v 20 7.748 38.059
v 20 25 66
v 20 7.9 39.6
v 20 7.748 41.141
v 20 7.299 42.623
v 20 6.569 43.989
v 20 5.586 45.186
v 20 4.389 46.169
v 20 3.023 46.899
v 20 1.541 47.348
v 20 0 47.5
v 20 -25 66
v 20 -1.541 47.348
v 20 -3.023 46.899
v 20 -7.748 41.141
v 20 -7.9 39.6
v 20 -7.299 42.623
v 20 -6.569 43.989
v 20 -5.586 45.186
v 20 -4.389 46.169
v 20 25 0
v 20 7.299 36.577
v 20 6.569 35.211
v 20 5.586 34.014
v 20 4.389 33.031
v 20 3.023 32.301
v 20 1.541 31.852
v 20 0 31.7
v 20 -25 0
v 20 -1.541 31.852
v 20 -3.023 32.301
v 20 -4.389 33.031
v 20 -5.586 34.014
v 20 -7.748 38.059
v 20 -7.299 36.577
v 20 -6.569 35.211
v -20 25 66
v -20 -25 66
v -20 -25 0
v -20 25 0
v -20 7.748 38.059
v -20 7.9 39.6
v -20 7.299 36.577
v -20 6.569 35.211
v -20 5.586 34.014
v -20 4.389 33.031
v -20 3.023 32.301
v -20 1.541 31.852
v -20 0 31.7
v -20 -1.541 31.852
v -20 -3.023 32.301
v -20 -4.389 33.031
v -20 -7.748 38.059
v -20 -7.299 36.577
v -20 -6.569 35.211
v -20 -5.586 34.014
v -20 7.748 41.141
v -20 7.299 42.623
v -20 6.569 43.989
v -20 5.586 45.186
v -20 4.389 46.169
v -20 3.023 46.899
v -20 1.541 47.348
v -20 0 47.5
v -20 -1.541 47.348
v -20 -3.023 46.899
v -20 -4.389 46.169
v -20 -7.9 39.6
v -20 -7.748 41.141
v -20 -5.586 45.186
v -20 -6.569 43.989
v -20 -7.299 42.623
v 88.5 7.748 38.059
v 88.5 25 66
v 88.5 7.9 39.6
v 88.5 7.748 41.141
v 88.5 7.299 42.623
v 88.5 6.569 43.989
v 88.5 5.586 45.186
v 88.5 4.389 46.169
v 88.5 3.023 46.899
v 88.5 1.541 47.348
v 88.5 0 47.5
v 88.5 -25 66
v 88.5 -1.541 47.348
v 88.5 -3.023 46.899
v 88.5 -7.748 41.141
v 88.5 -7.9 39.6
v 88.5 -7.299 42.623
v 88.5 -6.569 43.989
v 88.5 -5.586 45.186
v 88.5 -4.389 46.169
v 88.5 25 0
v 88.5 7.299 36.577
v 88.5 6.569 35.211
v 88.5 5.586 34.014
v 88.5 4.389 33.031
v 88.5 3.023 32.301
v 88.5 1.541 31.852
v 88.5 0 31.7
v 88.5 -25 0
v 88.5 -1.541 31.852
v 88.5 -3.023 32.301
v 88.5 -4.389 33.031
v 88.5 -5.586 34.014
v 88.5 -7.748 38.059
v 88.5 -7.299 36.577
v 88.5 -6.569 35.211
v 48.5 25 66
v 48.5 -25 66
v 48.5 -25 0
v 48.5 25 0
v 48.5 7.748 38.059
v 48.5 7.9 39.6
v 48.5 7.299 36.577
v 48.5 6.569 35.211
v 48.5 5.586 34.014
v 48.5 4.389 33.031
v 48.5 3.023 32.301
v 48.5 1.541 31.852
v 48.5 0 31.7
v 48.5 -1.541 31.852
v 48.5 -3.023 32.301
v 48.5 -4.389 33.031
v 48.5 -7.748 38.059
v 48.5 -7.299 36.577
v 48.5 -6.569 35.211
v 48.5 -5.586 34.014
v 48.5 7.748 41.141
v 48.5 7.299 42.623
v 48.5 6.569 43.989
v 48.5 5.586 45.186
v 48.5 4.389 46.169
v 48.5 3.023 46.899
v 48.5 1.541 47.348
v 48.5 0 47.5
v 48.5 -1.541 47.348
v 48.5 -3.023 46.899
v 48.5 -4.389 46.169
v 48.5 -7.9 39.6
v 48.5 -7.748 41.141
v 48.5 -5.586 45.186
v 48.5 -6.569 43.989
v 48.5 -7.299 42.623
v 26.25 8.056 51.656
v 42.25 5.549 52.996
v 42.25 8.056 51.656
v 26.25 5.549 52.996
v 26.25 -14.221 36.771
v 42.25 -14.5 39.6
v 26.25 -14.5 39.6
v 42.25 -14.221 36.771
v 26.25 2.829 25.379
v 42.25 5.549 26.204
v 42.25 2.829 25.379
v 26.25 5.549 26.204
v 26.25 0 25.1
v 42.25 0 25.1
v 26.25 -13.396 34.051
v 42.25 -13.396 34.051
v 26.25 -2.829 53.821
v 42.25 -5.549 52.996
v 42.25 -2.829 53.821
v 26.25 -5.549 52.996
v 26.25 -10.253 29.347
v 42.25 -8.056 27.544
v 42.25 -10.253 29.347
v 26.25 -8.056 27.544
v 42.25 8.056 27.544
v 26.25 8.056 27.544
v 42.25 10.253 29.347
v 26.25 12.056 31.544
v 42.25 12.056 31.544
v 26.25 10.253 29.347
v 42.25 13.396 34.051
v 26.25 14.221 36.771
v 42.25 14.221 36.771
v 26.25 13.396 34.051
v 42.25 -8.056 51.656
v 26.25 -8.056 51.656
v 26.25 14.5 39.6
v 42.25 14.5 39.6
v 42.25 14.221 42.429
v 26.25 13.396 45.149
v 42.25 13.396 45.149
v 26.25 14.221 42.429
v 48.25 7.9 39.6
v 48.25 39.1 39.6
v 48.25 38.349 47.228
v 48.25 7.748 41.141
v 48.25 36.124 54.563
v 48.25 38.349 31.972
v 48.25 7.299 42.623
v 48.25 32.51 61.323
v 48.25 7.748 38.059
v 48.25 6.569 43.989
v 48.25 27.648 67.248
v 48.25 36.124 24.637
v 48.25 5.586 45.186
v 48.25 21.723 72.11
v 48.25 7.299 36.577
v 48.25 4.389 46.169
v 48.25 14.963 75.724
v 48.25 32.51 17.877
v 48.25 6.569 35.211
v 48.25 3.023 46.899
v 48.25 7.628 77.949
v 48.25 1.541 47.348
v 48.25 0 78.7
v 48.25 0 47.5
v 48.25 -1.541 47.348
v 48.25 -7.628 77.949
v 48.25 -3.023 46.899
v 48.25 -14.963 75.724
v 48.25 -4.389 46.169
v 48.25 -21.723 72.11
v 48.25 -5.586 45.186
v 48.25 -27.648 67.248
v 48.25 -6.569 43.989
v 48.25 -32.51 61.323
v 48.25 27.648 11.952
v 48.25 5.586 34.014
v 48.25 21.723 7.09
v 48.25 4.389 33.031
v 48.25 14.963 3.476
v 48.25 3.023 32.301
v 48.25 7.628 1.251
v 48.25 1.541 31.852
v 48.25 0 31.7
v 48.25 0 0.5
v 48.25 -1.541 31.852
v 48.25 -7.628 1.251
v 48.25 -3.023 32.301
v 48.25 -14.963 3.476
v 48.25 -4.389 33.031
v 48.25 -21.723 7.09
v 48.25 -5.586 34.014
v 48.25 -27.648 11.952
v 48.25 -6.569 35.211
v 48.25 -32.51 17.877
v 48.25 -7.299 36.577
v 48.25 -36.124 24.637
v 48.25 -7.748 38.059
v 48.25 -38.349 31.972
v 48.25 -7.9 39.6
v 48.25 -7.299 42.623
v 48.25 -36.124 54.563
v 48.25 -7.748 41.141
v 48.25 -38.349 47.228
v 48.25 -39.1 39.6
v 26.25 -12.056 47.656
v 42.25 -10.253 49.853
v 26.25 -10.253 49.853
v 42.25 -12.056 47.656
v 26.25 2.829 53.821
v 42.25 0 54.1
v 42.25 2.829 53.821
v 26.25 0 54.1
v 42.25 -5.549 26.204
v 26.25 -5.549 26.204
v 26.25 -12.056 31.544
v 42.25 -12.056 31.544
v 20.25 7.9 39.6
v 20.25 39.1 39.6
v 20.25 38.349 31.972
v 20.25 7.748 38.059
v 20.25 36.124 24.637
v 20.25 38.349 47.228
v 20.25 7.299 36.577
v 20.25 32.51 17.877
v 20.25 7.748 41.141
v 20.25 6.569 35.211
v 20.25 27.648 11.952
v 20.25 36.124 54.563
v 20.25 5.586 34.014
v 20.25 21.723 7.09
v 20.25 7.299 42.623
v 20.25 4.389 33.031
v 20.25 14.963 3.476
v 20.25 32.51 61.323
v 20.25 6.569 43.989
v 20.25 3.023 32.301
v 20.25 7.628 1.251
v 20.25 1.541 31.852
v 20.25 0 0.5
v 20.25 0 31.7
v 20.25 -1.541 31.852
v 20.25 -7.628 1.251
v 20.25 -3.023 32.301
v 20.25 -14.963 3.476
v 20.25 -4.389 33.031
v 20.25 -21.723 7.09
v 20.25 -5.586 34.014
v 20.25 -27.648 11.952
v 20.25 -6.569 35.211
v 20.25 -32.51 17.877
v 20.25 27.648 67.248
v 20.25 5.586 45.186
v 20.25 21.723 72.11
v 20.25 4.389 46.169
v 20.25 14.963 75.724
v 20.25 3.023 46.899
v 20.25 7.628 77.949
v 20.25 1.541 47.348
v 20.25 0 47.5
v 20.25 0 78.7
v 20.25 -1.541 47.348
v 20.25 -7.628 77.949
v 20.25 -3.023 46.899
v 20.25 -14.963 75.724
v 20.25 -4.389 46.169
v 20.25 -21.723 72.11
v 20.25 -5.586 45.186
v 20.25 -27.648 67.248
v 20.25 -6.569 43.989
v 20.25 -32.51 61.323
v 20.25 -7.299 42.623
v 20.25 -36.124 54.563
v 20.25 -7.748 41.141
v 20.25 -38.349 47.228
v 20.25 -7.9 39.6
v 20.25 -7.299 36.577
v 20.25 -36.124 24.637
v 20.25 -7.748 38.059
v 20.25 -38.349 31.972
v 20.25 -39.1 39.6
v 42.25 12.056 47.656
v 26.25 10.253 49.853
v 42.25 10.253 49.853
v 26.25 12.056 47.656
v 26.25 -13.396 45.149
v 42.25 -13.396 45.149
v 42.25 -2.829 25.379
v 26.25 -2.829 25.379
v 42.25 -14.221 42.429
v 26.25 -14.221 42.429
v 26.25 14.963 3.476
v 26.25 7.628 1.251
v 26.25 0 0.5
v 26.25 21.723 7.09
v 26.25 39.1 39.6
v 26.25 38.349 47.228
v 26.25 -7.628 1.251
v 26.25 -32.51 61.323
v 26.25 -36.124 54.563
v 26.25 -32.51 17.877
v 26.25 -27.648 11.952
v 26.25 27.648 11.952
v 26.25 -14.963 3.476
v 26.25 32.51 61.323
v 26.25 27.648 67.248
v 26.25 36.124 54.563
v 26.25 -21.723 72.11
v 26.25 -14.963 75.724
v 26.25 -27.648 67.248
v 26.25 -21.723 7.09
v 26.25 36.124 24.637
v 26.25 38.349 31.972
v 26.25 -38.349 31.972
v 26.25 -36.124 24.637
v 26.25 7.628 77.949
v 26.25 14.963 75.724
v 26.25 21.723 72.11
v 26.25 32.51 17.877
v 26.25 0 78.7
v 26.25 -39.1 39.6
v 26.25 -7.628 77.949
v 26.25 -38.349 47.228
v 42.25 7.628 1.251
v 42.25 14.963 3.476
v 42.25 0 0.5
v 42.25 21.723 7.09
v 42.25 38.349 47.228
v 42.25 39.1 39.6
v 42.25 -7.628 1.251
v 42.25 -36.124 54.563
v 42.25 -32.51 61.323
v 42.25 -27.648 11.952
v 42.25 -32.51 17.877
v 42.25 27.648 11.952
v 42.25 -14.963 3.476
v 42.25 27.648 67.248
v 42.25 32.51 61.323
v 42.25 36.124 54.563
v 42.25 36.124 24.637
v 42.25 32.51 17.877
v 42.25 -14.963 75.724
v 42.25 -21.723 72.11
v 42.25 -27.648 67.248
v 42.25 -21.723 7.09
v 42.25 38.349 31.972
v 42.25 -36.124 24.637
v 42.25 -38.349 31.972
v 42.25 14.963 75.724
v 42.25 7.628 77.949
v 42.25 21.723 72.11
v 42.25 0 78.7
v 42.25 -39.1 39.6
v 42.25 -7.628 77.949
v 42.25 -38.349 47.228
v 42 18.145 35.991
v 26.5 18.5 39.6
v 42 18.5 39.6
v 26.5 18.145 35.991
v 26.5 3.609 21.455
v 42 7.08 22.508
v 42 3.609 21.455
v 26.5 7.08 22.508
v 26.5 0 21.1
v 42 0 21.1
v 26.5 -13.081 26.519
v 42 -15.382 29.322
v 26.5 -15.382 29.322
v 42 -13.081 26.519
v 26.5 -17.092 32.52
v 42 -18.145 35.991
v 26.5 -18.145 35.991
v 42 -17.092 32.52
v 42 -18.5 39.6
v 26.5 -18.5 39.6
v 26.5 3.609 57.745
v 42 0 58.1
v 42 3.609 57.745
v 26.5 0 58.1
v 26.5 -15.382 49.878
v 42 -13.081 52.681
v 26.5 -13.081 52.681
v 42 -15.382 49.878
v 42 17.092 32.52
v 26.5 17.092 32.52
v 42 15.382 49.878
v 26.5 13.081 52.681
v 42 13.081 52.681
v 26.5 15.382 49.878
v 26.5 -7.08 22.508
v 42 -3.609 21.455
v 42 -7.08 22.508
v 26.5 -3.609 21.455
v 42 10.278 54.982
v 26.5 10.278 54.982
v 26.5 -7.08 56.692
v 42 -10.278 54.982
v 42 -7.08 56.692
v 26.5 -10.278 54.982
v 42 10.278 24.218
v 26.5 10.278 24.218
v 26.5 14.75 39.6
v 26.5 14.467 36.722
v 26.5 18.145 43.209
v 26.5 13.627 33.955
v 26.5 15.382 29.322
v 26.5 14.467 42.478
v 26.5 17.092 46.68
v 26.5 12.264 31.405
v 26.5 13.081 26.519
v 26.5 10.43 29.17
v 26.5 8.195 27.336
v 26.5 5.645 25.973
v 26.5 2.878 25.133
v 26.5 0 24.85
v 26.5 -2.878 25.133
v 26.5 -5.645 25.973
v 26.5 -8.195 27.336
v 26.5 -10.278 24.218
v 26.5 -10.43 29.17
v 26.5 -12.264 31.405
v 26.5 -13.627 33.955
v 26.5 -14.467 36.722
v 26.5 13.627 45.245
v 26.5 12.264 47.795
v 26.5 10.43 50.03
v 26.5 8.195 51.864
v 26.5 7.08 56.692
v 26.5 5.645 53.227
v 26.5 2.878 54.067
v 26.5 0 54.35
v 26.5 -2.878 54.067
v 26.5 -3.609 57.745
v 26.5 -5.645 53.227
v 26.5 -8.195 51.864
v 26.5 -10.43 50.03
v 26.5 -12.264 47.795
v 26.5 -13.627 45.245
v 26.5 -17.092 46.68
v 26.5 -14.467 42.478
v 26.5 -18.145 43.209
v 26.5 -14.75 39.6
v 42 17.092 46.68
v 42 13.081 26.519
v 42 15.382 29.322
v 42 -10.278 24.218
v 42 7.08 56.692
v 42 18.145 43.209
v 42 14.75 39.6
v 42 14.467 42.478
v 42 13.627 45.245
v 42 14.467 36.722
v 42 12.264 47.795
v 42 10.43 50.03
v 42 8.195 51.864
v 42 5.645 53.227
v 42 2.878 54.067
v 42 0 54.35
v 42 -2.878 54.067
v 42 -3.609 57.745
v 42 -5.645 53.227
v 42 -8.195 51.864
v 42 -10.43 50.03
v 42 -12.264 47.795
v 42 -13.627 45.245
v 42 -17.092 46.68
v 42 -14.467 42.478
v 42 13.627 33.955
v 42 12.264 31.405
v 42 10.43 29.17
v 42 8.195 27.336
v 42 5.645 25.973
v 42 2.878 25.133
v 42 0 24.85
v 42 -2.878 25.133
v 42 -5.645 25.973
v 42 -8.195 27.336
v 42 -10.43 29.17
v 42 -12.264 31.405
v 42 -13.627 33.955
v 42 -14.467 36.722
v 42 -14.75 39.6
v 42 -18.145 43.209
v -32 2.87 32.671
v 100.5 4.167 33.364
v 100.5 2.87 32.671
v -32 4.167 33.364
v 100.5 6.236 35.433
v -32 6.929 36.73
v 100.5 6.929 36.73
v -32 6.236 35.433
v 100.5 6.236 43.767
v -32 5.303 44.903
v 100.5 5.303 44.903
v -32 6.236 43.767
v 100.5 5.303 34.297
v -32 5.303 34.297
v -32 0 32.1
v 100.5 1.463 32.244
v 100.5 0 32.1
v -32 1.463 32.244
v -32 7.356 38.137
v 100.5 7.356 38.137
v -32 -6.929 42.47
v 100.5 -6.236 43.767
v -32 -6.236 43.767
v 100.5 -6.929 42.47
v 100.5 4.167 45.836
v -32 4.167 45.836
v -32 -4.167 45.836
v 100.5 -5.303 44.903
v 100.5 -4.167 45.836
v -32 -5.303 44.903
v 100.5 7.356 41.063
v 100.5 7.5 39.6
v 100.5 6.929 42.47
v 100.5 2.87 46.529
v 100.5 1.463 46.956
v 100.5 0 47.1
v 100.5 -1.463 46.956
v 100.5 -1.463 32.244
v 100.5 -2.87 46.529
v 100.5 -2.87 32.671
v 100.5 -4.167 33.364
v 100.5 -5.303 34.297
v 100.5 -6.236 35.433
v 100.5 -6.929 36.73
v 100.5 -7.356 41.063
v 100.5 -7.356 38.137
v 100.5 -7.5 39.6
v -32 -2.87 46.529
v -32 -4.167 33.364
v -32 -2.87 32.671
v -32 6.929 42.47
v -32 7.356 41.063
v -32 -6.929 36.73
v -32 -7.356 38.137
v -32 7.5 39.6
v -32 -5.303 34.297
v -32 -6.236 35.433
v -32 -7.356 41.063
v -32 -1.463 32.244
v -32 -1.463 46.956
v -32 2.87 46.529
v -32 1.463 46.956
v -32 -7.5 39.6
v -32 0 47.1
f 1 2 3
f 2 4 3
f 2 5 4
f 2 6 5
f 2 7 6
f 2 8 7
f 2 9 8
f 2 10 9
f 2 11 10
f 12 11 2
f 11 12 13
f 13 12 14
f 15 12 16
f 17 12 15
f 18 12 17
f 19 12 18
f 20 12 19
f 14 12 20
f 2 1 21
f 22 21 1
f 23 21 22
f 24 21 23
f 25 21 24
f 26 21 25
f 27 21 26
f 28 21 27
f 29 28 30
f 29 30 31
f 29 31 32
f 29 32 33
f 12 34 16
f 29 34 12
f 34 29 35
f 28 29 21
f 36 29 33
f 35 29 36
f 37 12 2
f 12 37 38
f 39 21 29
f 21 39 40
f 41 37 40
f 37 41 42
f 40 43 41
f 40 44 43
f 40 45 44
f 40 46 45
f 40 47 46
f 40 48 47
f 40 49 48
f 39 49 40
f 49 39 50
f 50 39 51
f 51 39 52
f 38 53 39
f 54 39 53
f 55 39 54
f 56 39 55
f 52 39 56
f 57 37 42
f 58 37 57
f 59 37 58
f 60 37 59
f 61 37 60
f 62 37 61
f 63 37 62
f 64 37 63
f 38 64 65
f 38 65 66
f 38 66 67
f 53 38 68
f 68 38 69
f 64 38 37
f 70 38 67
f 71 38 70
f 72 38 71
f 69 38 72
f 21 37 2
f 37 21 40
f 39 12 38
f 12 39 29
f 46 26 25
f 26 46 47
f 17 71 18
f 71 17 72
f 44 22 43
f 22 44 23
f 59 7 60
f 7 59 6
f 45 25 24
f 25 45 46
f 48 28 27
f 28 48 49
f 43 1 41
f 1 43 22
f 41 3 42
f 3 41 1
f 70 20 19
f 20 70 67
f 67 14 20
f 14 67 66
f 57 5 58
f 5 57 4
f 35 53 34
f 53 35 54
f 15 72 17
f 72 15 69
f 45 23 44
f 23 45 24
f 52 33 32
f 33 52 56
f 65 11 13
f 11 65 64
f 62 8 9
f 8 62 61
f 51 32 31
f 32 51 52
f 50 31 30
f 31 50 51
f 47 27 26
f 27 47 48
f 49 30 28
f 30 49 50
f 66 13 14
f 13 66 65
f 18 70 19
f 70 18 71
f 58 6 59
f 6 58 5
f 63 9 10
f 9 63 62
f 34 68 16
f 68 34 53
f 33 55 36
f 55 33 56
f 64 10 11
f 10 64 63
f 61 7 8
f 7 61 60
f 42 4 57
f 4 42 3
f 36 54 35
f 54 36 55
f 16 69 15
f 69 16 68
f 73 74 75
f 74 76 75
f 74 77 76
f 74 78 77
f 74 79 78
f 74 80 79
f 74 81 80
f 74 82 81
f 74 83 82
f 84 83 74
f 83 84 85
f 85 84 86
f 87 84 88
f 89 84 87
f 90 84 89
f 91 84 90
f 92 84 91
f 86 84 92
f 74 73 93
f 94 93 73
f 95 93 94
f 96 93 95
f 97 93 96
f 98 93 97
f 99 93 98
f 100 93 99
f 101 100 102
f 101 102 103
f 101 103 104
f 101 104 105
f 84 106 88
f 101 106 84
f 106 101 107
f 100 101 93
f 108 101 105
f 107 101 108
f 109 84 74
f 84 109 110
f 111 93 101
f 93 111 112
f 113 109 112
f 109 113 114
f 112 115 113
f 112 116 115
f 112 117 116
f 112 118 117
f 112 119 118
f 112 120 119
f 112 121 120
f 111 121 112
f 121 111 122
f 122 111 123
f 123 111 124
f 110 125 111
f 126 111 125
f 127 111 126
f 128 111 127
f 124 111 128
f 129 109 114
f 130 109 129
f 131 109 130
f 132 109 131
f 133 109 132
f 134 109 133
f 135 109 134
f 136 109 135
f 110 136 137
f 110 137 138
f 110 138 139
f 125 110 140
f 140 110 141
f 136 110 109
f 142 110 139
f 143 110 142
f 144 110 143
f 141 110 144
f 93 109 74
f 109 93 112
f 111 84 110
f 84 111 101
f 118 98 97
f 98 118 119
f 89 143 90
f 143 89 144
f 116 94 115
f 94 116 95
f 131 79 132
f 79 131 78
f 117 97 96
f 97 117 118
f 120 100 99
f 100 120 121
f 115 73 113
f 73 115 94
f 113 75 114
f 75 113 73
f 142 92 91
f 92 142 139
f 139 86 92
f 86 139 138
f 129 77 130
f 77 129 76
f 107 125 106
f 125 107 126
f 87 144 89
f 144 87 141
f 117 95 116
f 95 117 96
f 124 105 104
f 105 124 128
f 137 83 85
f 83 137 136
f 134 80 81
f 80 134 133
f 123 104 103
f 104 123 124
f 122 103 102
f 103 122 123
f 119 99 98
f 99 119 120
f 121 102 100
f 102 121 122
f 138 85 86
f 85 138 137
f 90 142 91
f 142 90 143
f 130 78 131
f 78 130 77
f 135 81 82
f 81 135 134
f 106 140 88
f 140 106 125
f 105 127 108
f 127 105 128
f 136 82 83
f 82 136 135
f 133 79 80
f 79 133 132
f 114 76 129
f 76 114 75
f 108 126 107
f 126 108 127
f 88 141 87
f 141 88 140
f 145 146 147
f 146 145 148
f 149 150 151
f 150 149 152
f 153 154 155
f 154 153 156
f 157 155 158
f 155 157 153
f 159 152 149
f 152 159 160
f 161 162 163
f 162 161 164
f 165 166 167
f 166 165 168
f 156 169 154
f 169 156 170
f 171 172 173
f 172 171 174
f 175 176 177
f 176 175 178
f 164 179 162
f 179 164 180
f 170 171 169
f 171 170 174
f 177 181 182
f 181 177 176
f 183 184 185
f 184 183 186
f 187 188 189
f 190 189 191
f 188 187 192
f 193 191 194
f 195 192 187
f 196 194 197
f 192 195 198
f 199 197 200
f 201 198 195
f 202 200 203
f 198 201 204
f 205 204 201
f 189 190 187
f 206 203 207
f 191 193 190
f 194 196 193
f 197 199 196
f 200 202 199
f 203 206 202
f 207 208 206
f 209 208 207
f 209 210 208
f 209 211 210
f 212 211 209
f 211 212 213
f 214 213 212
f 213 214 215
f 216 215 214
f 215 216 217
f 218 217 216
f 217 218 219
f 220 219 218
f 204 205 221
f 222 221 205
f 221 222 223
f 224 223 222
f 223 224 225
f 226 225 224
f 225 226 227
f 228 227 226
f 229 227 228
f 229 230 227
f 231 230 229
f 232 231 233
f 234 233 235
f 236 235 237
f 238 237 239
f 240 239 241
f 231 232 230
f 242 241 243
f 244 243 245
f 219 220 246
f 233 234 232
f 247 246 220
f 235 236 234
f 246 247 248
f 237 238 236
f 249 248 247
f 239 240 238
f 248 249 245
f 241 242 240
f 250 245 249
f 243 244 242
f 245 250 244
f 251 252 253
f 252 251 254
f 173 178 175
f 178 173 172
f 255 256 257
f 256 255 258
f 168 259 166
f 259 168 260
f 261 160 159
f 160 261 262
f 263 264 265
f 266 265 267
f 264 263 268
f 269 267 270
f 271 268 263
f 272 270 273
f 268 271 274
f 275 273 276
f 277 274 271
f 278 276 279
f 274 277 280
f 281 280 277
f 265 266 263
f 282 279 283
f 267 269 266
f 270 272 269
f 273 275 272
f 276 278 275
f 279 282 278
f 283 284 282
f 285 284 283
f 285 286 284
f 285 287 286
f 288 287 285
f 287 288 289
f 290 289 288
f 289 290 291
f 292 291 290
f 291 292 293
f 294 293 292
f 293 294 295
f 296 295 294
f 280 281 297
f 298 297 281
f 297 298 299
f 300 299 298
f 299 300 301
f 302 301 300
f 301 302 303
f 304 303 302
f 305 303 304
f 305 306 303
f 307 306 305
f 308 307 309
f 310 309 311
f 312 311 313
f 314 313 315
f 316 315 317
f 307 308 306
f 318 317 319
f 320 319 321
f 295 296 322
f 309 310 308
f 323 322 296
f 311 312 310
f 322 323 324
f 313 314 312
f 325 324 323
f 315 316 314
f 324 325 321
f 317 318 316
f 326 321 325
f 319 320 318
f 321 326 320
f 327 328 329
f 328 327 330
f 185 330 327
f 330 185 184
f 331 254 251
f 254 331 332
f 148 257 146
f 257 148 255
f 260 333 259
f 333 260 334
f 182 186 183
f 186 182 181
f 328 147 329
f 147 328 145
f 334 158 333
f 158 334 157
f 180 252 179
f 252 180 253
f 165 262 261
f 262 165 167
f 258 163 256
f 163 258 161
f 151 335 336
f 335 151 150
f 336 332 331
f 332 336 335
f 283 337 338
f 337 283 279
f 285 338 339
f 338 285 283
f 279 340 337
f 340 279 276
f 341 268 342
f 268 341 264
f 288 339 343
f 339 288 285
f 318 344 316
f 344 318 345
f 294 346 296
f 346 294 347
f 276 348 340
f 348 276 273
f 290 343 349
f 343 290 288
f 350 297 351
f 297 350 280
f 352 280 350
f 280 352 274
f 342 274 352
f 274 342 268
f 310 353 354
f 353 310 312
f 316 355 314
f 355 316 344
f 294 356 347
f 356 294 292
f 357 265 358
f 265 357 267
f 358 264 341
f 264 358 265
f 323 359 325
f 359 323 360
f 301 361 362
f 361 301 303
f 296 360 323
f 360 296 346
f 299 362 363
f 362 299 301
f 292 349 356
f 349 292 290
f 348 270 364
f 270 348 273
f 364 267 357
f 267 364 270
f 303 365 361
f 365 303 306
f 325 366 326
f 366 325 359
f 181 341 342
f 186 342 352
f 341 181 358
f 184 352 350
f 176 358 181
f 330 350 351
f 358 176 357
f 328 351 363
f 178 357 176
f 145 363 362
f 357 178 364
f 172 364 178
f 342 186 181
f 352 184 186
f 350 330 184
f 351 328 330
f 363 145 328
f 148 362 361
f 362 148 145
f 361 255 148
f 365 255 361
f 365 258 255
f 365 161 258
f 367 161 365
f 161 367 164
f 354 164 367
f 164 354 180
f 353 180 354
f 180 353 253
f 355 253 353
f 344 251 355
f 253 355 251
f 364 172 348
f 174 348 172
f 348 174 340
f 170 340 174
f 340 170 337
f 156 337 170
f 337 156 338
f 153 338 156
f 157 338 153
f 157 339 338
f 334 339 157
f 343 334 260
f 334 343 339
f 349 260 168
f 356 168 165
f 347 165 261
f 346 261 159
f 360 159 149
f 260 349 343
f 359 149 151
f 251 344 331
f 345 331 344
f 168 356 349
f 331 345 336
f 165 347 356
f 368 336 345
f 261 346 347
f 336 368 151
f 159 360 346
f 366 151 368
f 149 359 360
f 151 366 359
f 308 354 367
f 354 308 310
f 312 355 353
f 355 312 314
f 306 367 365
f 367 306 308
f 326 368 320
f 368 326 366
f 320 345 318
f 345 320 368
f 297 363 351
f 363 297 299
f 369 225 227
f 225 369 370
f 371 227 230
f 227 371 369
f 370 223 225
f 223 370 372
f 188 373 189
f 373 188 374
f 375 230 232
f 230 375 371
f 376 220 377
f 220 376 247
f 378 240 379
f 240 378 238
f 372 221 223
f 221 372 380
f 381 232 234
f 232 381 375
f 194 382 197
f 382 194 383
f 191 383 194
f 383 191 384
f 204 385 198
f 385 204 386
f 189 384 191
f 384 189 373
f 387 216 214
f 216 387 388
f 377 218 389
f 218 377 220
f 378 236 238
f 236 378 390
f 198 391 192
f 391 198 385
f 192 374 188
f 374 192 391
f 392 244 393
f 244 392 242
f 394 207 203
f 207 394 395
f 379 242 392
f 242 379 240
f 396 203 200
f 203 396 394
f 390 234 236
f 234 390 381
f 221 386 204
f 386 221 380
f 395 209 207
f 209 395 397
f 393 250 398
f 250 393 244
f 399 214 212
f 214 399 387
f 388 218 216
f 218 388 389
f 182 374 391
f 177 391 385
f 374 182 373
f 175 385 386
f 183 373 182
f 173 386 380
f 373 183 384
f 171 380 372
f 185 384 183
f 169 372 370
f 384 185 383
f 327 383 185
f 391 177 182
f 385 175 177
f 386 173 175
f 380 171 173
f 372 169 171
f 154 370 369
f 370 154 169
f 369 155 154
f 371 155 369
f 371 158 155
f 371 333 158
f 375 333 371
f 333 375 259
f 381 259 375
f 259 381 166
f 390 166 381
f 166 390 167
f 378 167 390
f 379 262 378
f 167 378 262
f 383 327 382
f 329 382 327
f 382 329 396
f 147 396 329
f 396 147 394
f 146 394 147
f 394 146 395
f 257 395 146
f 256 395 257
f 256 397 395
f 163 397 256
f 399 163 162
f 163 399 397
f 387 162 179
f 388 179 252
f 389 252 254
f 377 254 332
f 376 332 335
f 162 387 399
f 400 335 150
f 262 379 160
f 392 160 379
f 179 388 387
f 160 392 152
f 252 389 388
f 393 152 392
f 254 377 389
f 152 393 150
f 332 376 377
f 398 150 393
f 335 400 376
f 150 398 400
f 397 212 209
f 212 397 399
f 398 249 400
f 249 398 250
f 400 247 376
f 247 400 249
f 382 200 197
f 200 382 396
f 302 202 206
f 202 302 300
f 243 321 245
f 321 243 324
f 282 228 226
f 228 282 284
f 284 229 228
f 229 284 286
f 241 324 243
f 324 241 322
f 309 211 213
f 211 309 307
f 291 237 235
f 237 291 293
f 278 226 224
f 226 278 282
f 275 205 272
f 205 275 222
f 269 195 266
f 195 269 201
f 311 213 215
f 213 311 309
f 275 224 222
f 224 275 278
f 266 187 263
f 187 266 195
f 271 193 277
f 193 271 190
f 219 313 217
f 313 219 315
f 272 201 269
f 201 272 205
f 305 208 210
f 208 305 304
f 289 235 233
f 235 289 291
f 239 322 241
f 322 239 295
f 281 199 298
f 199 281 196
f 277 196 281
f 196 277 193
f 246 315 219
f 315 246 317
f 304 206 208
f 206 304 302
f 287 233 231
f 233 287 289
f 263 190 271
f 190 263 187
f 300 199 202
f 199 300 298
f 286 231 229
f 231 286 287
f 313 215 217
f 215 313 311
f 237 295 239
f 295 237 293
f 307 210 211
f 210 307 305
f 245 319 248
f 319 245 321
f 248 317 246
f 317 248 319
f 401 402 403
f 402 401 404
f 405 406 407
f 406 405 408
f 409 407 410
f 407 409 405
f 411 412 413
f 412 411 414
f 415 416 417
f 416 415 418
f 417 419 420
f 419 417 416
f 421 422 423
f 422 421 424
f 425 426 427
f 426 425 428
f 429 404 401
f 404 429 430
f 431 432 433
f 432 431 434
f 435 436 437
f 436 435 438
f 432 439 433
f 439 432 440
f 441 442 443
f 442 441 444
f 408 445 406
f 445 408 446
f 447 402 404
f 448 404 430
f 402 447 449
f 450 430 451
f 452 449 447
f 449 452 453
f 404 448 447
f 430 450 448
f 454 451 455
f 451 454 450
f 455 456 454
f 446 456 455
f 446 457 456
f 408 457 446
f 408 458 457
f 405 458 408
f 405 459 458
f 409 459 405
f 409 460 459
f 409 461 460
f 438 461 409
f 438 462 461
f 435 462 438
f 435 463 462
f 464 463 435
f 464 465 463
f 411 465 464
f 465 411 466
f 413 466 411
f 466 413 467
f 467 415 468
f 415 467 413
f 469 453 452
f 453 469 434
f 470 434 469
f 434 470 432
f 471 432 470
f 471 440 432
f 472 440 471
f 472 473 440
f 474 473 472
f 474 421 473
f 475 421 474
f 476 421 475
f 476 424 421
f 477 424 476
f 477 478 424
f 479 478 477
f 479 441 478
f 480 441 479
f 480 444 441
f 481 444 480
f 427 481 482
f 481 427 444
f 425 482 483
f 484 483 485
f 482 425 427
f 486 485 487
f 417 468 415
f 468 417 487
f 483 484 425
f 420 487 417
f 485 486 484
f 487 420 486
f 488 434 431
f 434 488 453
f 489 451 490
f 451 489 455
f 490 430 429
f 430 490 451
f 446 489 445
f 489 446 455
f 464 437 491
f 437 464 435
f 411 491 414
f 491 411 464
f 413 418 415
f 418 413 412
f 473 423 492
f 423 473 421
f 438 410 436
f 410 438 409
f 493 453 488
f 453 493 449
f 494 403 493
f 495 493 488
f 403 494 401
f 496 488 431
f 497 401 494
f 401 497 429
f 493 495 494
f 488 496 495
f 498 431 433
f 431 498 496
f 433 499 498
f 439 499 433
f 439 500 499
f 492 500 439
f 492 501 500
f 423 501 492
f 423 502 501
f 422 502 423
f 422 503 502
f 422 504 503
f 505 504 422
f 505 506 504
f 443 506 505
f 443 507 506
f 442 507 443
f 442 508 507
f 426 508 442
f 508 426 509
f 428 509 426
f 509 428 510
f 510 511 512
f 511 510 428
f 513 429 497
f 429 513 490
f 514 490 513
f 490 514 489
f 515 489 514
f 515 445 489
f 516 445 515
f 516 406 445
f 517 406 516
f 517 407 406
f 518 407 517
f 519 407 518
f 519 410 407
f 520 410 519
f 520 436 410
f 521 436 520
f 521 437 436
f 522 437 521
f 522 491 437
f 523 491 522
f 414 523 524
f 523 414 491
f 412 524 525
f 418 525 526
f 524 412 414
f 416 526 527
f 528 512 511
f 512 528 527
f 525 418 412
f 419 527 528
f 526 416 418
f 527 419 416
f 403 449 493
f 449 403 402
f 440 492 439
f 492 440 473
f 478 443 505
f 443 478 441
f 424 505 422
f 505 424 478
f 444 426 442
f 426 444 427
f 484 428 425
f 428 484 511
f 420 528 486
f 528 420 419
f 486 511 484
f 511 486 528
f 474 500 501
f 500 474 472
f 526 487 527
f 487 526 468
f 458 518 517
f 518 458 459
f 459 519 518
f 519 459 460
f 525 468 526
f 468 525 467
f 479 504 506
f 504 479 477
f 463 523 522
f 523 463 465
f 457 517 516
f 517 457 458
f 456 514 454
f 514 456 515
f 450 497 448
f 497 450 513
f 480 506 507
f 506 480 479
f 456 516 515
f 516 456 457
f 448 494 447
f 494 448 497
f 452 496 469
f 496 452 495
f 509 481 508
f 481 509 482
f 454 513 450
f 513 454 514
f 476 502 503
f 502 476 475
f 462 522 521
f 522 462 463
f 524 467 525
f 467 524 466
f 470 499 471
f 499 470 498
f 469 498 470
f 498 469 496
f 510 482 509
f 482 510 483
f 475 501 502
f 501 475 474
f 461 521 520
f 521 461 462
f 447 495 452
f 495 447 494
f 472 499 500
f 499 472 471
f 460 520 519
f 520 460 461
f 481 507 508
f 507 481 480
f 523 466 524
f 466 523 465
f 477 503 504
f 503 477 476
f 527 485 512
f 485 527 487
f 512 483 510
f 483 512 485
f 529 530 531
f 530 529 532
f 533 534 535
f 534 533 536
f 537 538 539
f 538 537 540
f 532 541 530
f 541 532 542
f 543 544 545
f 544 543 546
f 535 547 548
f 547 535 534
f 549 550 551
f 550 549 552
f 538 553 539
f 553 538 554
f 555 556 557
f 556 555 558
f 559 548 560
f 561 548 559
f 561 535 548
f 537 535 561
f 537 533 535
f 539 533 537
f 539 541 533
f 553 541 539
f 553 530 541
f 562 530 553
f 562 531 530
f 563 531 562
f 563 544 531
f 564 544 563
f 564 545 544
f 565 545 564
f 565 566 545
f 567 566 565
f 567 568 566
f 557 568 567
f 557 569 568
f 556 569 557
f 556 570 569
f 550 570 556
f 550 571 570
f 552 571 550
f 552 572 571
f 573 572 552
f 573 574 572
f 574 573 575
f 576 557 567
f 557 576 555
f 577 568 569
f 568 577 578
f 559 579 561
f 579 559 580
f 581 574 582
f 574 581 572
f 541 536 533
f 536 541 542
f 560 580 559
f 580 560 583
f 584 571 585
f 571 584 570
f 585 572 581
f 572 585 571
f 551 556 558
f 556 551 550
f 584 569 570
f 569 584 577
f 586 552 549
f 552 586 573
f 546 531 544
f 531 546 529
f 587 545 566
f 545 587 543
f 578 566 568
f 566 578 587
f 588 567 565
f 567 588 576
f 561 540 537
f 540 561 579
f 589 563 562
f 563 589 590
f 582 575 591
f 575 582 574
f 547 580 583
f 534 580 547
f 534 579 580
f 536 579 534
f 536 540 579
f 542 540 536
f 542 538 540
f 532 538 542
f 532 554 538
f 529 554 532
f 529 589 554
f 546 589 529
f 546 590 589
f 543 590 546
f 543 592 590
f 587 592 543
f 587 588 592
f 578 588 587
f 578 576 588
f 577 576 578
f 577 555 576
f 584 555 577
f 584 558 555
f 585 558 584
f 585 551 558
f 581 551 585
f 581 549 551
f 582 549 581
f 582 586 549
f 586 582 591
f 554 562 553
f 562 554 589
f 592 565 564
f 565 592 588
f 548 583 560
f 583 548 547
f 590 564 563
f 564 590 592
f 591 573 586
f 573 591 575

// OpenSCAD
$fn = 32;

// ------------------------------------------------------------------------
// Pulley assembly: d78.2 pulley with a belt, shaft d15
// Every part is its own module, assembly() places them once.
// ------------------------------------------------------------------------

// --- part 1 ---
module support1() {
  difference() {
    translate([-20, -25, 0]) cube([40, 50, 66]);
    translate([0, 0, 39.6]) rotate([0, 90, 0]) cylinder(h = 42, d = 15.8, center = true);
  }
}

// --- part 2 ---
module support2() {
  difference() {
    translate([-20, -25, 0]) cube([40, 50, 66]);
    translate([0, 0, 39.6]) rotate([0, 90, 0]) cylinder(h = 42, d = 15.8, center = true);
  }
}

// --- part 3 ---
module shaft() {
  translate([0, 0, -66.25]) cylinder(h = 132.5, d = 15);
}

// --- part 4 ---
module pulley() {
  difference() {
    union() {
      cylinder(h = 28, d = 29);
      cylinder(h = 6, d = 78.2);
      translate([0, 0, 22]) cylinder(h = 6, d = 78.2);
    }
    translate([0, 0, -1]) cylinder(h = 30, d = 15.8);
  }
}

// --- part 5 ---
module belt() {
  difference() {
      translate([0, 0, 0]) cylinder(h = 15.5, d = 37);
      translate([0, 0, -1]) cylinder(h = 17.5, d = 29.5);
    }
}

// --- assembly ---
module assembly() {
  translate([0, 0, 0]) rotate([0, 0, 0]) support1();
  translate([68.5, 0, 0]) rotate([0, 0, 0]) support2();
  translate([34.25, 0, 39.6]) rotate([0, 90, 0]) shaft();
  translate([20.25, 0, 39.6]) rotate([0, 90, 0]) pulley();
  translate([26.5, 0, 39.6]) rotate([0, 90, 0]) belt();
}

assembly();
